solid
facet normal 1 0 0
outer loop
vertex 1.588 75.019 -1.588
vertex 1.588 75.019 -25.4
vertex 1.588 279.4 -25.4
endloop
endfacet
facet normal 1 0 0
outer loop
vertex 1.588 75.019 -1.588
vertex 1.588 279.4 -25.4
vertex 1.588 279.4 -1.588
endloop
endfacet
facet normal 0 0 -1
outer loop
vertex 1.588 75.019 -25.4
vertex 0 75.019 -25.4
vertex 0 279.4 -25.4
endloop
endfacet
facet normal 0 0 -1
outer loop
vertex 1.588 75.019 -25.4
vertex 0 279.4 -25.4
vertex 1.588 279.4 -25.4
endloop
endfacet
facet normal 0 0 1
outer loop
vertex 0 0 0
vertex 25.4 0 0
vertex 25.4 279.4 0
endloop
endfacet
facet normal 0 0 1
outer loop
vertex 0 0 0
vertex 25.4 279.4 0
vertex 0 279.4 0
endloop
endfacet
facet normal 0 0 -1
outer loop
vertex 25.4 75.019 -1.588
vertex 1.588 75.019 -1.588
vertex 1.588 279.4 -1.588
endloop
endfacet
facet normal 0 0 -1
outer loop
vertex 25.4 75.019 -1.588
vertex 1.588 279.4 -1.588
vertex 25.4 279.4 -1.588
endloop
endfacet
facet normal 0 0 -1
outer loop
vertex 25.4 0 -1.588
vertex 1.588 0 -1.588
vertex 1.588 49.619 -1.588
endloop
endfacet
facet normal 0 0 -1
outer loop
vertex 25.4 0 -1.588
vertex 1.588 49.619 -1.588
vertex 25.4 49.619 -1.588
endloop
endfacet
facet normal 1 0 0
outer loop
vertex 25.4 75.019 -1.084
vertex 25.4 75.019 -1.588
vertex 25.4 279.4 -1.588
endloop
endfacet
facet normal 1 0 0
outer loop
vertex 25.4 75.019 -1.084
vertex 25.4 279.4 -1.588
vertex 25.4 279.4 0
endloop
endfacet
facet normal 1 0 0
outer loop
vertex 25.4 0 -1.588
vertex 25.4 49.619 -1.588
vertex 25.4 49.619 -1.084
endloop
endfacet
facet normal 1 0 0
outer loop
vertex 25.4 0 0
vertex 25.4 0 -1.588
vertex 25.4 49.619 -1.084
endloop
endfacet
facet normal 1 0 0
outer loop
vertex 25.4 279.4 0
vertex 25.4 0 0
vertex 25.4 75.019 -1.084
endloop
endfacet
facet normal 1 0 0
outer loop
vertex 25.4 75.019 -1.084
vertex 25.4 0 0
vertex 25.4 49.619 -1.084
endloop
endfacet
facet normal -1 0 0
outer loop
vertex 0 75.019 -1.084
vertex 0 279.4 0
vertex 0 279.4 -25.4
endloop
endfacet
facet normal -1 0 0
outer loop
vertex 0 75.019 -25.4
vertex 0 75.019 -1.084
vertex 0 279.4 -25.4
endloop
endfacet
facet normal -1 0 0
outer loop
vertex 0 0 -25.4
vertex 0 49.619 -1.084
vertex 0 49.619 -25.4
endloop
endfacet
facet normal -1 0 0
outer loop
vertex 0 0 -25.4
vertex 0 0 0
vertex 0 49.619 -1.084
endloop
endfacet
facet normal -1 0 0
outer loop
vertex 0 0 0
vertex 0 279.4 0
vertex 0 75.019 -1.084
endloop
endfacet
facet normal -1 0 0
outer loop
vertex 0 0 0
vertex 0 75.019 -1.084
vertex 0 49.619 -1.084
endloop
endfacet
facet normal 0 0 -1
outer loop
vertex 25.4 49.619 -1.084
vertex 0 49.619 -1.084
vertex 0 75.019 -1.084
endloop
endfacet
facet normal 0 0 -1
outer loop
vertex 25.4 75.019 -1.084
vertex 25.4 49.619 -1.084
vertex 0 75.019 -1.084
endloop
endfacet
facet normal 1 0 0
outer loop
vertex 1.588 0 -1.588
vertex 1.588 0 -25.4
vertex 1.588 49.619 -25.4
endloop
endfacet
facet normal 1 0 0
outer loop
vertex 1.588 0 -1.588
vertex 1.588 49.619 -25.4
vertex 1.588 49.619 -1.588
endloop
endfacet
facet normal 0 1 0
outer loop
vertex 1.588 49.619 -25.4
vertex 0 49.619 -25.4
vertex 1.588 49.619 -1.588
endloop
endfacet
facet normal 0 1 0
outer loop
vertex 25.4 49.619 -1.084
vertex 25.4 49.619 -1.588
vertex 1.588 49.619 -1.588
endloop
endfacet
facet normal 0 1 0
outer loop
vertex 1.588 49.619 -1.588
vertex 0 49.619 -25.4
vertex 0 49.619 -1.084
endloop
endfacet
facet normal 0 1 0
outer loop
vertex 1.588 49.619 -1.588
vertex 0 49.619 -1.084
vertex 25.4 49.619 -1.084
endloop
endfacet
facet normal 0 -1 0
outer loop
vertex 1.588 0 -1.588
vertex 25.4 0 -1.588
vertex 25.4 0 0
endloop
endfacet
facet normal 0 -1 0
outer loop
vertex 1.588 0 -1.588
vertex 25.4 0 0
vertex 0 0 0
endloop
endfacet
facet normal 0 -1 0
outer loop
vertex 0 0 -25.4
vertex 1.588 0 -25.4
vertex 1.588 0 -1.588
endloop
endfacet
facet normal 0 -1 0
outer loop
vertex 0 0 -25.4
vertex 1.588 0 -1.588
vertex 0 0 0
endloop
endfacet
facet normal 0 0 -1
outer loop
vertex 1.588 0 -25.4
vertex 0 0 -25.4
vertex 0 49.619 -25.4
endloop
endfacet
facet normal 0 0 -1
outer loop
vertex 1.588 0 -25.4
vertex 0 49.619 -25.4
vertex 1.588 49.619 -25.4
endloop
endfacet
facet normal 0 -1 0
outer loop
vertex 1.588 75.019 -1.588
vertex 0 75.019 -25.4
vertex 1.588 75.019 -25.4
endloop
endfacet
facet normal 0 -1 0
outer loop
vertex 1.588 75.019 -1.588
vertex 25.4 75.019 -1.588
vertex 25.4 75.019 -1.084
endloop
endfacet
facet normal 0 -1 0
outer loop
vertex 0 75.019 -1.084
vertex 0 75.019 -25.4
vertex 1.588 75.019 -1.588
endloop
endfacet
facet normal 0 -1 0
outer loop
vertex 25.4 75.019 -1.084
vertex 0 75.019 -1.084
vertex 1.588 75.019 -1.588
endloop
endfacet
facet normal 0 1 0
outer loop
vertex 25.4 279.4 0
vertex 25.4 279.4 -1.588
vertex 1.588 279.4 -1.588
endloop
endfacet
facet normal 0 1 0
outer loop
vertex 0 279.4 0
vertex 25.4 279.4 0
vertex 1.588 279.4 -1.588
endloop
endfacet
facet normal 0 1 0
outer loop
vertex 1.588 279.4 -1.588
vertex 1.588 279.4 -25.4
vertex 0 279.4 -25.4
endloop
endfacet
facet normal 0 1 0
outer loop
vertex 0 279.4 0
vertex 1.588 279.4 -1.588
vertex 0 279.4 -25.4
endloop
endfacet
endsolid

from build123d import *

# Parameters (mm, degrees)
BOSS_EXTRUDE1_DEPTH = 279.4
SKETCH4_W           = 24.315928
SKETCH4_H           = 25.4
CUT_EXTRUDE1_DEPTH  = 26.4


with BuildPart() as part:
    # Sketch1 → Boss-Extrude1 (new body)
    with BuildSketch(Plane(origin=(0, 0, 0), x_dir=(1, 0, 0), z_dir=(0, 1, 0))):
        Polygon((0, 0), (0, 25.4), (1.5875, 25.4), (1.5875, 1.5875), (25.4, 1.5875), (25.4, 0), align=None)
    extrude(amount=BOSS_EXTRUDE1_DEPTH)

    # Sketch4 → Cut-Extrude1 (cut, through all)
    with BuildSketch(Plane.ZY):
        with Locations((-13.242036, 62.3189)):
            Rectangle(SKETCH4_W, SKETCH4_H)
    extrude(amount=-CUT_EXTRUDE1_DEPTH, mode=Mode.SUBTRACT)


solid = part.part
